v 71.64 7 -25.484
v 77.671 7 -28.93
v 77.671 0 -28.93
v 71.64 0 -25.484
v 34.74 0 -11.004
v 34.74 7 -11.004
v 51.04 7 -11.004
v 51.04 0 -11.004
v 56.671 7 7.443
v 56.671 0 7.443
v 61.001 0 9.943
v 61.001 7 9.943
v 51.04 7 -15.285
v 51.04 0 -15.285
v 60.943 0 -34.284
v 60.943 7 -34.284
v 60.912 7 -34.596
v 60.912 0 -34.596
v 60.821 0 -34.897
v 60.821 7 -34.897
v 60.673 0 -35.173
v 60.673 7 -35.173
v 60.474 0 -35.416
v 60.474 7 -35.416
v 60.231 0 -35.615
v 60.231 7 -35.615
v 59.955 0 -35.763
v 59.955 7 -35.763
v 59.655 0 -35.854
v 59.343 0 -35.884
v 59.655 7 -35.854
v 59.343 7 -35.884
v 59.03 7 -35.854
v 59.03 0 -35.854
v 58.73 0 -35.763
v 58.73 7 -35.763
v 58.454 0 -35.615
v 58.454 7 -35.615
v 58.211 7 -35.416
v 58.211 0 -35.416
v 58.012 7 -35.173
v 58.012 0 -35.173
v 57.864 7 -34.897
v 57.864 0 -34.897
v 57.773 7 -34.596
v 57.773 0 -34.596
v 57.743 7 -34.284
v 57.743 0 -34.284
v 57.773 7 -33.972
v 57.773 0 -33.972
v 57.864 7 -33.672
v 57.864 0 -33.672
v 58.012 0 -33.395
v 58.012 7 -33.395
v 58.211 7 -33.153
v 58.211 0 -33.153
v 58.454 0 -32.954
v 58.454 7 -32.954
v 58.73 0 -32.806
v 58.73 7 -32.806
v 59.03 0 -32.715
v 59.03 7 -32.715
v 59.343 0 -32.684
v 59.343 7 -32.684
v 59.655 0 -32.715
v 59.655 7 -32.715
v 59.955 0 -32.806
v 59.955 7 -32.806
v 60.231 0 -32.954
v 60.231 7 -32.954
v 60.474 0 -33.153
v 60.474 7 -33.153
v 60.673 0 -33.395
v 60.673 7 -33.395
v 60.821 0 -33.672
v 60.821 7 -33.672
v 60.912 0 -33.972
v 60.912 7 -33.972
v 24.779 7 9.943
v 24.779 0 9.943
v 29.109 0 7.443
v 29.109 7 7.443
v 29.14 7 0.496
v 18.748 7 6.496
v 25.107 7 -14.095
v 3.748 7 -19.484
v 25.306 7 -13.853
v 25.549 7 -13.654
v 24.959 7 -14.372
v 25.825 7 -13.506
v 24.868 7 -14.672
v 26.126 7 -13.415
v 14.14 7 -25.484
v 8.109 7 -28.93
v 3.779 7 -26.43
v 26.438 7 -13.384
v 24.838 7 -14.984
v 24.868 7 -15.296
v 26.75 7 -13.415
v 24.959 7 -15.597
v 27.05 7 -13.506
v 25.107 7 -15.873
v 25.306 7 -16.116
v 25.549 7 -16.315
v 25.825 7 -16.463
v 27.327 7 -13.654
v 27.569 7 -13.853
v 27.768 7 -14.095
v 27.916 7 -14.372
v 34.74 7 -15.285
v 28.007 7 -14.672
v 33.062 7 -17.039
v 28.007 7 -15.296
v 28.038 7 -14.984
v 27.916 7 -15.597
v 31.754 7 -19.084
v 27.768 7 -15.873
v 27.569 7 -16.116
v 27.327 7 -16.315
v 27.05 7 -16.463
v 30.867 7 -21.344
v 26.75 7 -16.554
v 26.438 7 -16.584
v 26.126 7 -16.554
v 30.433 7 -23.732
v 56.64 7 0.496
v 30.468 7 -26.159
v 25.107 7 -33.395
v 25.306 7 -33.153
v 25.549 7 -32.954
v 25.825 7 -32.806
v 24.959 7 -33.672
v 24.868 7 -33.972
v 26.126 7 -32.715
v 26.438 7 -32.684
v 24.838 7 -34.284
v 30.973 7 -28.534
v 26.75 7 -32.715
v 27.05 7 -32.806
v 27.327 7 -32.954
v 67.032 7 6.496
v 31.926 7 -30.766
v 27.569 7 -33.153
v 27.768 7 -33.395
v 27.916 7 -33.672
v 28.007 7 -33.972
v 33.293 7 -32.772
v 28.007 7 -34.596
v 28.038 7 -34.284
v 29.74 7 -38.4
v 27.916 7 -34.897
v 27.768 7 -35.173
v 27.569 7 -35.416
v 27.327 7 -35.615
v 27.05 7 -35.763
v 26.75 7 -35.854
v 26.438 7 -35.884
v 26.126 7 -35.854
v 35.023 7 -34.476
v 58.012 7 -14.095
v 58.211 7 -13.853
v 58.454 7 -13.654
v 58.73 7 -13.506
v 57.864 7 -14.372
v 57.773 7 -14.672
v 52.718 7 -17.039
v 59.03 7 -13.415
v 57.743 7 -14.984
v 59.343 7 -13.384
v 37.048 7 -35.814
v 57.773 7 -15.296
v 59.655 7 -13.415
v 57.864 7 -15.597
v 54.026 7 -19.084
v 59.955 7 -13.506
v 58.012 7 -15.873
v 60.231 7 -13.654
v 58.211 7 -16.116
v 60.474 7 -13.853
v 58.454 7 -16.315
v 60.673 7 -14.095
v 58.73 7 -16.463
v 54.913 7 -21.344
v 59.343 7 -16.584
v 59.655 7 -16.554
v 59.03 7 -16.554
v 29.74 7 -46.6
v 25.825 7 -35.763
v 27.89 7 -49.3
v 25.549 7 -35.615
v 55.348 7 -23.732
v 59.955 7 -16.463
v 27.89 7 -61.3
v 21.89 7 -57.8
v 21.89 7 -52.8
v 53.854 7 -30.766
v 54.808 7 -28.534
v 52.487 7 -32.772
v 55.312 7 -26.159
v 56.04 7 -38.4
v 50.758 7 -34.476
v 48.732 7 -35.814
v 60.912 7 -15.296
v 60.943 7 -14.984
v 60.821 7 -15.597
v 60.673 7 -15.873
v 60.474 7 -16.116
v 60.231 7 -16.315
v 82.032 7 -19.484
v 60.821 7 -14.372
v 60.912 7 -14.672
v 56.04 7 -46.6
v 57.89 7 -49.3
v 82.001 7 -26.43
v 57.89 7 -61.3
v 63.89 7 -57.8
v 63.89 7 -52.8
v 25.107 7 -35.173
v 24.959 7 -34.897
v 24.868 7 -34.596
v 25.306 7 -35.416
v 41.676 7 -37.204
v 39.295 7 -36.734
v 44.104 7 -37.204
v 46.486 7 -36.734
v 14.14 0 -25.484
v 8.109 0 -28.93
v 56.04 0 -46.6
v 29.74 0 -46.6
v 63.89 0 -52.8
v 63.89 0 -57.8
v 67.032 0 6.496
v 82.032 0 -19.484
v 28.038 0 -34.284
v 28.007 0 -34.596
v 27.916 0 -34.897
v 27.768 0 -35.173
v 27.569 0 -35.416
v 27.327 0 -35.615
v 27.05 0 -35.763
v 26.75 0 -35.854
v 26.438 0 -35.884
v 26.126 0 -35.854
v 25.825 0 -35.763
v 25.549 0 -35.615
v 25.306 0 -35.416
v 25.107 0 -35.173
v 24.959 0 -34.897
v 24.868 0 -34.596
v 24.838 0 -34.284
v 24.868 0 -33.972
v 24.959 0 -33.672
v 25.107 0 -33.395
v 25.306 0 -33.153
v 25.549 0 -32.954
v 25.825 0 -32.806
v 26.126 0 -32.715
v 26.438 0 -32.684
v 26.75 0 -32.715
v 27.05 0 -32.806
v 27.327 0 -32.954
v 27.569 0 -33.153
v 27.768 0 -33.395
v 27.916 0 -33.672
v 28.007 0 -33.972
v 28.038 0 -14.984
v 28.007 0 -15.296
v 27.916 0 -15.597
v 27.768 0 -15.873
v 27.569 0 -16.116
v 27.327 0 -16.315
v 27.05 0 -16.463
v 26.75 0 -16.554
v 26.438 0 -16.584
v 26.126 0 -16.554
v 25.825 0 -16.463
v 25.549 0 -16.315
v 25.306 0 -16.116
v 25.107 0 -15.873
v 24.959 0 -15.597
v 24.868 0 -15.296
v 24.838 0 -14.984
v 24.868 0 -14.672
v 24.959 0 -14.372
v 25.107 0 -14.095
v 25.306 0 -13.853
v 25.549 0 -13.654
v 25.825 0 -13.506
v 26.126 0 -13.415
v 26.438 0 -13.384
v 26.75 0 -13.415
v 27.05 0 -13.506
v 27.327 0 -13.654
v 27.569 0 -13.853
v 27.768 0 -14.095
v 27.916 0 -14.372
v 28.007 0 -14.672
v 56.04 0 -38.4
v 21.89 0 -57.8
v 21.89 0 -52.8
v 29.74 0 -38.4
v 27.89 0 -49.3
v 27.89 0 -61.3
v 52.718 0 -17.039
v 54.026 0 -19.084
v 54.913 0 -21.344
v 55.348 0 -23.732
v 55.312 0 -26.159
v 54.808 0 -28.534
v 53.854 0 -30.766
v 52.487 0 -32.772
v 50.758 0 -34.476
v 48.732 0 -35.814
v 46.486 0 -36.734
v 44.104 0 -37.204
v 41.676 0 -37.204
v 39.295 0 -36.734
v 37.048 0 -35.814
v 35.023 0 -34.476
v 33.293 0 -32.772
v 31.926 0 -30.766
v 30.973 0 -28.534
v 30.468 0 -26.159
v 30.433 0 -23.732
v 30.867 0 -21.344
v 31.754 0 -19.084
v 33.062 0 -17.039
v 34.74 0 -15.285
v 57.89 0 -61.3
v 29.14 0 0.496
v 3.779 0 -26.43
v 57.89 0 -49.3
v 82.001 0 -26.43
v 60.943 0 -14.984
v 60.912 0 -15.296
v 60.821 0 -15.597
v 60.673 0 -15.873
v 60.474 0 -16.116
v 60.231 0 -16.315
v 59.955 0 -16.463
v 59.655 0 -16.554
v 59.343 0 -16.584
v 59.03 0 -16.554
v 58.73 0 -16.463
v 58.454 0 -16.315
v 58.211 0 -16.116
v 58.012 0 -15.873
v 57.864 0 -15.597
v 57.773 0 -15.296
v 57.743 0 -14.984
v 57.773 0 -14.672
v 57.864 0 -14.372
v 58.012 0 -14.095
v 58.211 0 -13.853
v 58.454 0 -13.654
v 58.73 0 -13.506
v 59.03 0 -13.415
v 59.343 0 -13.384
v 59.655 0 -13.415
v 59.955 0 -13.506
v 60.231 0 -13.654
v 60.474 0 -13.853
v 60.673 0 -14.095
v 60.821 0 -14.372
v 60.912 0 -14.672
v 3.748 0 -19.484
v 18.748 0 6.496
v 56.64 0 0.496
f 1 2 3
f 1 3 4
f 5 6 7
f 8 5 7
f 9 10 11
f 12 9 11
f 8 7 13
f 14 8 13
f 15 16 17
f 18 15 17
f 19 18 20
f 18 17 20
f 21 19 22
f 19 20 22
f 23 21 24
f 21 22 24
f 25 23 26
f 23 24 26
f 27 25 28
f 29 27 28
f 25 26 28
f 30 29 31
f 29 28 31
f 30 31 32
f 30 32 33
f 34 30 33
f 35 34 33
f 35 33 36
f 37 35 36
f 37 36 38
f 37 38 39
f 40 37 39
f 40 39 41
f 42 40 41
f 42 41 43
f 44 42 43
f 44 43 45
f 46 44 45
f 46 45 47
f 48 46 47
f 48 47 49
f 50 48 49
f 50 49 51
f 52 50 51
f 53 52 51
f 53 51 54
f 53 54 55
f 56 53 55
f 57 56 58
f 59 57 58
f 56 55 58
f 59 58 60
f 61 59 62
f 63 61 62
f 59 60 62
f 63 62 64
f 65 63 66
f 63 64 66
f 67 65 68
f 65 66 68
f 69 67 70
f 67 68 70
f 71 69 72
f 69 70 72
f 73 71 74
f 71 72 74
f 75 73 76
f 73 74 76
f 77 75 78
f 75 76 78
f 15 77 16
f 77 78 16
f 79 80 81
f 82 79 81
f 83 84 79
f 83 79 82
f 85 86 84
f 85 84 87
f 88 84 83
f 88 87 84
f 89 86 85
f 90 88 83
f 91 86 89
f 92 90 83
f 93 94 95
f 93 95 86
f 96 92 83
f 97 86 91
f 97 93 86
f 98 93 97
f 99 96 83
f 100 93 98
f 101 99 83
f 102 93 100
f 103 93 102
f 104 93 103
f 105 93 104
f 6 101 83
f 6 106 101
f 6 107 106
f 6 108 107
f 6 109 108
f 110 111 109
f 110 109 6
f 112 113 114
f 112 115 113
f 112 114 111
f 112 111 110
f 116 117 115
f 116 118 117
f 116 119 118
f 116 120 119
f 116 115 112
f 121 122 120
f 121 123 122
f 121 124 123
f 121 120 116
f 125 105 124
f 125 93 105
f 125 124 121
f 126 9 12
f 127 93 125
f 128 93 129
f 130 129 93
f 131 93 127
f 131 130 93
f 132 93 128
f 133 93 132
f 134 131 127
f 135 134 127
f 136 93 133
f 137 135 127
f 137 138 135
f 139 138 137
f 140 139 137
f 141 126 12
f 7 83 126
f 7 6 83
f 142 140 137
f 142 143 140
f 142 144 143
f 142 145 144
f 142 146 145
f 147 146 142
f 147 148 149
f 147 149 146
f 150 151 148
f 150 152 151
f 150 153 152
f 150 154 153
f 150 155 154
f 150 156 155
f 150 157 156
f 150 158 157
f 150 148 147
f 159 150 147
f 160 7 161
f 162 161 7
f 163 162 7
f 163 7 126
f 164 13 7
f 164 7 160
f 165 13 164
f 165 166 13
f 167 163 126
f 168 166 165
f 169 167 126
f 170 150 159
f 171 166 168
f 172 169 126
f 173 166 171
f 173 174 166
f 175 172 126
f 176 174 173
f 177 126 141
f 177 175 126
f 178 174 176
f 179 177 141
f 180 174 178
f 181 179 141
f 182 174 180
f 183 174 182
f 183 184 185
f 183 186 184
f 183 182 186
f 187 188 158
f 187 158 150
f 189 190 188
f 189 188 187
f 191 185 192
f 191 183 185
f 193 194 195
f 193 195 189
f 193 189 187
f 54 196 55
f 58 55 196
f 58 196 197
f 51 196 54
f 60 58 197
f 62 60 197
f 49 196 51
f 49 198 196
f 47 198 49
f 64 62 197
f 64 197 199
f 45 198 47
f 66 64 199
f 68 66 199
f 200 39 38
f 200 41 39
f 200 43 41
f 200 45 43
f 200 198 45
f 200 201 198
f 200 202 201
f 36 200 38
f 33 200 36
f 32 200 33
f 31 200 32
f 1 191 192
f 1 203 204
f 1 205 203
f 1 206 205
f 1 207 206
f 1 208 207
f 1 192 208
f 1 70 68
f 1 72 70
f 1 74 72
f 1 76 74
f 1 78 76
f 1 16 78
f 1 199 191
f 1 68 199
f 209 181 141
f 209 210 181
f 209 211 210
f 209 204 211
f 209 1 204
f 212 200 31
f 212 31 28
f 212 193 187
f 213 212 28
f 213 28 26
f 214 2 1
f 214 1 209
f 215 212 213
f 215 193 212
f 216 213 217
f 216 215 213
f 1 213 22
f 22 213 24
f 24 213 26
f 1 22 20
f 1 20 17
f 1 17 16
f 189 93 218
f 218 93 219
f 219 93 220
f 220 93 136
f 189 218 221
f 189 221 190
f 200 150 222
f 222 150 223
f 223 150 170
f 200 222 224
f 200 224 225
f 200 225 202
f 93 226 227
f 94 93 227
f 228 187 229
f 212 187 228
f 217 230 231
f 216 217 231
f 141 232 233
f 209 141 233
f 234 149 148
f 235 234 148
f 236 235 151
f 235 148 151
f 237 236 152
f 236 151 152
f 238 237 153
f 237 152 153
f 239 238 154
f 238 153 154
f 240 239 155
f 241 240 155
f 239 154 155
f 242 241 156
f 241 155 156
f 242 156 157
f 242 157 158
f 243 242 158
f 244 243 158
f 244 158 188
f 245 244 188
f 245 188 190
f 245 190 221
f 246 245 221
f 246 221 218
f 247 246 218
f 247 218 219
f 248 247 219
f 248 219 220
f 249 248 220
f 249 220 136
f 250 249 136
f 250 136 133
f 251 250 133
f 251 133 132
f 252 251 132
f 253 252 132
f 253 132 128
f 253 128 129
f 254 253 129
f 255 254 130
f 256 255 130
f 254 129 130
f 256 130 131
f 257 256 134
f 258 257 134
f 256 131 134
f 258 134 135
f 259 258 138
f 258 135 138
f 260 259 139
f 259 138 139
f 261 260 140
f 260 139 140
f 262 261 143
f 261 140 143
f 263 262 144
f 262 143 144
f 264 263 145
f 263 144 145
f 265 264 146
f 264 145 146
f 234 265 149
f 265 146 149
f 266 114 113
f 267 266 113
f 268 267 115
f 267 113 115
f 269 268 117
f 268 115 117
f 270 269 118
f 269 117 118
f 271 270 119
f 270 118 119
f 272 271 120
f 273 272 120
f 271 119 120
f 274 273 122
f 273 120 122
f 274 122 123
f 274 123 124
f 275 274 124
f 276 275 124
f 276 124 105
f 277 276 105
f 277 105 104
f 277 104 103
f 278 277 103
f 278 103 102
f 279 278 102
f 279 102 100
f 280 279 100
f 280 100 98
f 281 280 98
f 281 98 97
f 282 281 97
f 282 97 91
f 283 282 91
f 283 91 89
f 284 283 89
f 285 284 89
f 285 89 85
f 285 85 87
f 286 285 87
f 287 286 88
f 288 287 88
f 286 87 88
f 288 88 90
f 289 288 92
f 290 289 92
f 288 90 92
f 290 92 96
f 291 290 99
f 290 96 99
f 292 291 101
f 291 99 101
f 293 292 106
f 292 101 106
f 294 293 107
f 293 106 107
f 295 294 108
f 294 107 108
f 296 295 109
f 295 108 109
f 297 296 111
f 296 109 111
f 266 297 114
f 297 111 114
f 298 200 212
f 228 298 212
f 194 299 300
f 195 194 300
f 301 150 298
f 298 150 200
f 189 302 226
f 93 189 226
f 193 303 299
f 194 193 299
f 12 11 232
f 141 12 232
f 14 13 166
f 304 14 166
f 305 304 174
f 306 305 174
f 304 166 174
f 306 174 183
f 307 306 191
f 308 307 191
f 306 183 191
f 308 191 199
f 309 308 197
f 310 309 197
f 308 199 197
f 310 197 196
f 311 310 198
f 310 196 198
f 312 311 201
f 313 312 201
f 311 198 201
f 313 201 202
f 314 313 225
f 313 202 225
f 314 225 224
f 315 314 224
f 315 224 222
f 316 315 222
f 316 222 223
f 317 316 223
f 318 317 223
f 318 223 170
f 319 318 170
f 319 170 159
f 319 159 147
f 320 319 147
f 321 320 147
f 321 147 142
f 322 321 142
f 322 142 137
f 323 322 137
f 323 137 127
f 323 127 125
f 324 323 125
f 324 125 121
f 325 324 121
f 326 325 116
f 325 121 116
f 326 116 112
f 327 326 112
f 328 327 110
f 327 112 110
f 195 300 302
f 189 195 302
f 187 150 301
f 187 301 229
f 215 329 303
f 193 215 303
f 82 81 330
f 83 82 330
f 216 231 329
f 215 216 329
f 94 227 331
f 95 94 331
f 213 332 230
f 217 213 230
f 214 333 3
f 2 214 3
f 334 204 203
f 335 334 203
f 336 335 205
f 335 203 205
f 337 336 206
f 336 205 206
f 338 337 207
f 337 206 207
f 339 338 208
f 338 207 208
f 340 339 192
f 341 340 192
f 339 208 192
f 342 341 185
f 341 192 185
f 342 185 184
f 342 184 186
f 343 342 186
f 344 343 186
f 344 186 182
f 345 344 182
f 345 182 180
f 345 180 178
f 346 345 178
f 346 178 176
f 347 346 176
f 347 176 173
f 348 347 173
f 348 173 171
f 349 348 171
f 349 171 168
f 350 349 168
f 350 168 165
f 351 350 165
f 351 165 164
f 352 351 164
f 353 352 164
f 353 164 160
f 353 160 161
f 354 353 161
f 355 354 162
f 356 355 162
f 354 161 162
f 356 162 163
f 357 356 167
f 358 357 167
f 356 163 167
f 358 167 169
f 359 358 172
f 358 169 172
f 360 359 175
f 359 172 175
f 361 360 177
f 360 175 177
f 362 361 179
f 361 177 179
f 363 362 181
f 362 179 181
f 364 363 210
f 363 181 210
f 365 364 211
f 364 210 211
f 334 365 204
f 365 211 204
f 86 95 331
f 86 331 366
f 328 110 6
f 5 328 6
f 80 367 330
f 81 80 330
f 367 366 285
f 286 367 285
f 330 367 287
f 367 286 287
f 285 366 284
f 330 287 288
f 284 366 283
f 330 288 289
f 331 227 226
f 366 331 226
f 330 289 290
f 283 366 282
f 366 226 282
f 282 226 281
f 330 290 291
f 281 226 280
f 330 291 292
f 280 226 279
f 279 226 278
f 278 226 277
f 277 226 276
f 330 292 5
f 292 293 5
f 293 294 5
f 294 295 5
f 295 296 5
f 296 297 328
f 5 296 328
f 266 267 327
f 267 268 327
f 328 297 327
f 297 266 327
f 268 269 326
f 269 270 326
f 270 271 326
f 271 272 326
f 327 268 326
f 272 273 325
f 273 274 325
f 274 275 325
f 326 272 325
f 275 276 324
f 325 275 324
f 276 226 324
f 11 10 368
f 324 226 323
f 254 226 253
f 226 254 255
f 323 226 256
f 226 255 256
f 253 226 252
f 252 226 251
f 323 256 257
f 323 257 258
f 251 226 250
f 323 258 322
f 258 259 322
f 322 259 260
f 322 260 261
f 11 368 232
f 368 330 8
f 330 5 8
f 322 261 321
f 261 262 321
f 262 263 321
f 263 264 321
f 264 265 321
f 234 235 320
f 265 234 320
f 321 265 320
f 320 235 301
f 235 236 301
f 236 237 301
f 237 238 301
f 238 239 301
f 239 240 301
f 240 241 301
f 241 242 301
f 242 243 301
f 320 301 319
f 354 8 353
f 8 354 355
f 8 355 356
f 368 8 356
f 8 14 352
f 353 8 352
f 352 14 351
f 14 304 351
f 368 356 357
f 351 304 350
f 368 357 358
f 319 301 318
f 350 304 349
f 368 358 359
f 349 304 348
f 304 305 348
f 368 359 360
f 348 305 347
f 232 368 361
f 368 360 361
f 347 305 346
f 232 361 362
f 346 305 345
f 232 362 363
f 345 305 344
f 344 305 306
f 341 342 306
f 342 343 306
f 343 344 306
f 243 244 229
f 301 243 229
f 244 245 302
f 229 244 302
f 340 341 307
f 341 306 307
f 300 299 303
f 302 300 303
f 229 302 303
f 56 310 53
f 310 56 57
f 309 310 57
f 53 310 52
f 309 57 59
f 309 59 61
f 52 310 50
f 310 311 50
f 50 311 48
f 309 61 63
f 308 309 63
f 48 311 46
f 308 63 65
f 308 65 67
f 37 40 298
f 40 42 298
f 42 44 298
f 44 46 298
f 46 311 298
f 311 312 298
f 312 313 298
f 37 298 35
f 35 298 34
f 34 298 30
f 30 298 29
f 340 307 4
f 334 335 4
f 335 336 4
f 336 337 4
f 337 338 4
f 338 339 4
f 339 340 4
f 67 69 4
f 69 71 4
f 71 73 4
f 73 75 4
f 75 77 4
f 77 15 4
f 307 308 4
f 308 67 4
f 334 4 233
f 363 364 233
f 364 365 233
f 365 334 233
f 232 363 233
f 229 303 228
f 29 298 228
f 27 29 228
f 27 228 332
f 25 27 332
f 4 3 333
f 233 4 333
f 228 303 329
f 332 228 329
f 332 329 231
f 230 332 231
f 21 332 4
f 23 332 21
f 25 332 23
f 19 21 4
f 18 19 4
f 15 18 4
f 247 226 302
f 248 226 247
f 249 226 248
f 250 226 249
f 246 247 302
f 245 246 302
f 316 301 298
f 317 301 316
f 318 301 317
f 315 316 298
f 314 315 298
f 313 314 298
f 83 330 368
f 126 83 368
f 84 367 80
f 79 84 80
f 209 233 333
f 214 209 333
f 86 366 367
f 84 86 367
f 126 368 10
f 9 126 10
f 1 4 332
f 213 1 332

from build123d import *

# Parameters (mm, degrees)
BOSS_EXTRUDE3_DEPTH = 7
SKETCH2_R           = 1.6
SKETCH2_W           = 26.3
SKETCH2_H           = 8.2
CUT_EXTRUDE1_DEPTH  = 8


with BuildPart() as part:
    # Sketch1 → Boss-Extrude3 (new body)
    with BuildSketch(Plane(origin=(0, 0, 0), x_dir=(1, 0, 0), z_dir=(0, 1, 0))):
        Polygon((29.1090159, -7.44261314), (29.140104813, -0.496460718), (42.890104813, -0.496460718), (56.640104813, -0.496460718), (56.671193726, -7.44261314), (61.001320745, -9.94261314), (67.032409659, -6.496460718), (82.032409659, 19.484301396), (82.001320745, 26.430453819), (77.671193726, 28.930453819), (71.640104813, 25.484301396), (64.765104813, 37.392150698), (57.890104813, 49.3), (63.890104813, 52.8), (63.890104813, 57.8), (57.890104813, 61.3), (27.890104813, 61.3), (21.890104813, 57.8), (21.890104813, 52.8), (27.890104813, 49.3), (21.015104813, 37.392150698), (14.140104813, 25.484301396), (8.1090159, 28.930453819), (3.778888881, 26.430453819), (3.747799968, 19.484301396), (18.747799968, -6.496460718), (24.778888881, -9.94261314), align=None)
    extrude(amount=BOSS_EXTRUDE3_DEPTH)

    # Sketch2 → Cut-Extrude1 (cut, through all)
    with BuildSketch(Plane(origin=(0, 7, 0), x_dir=(1, 0, 0), z_dir=(0, 1, 0))):
        with Locations((59.342544079, 34.284301396)):
            Circle(SKETCH2_R)
        with Locations((59.342544079, 14.984301396)):
            Circle(SKETCH2_R)
        with Locations((26.437665547, 14.984301396)):
            Circle(SKETCH2_R)
        with Locations((26.437665547, 34.284301396)):
            Circle(SKETCH2_R)
        with BuildLine():
            Line((34.740104813, 11.003539282), (51.040104813, 11.003539282))
            Line((51.040104813, 11.003539282), (51.040104813, 15.284876488))
            ThreePointArc((51.040104813, 15.284876488), (42.890104813, 37.262613559), (34.740104813, 15.284876488))
            Line((34.740104813, 15.284876488), (34.740104813, 11.003539282))
        make_face()
        with Locations((42.890104813, 42.5)):
            Rectangle(SKETCH2_W, SKETCH2_H)
    extrude(amount=-CUT_EXTRUDE1_DEPTH, mode=Mode.SUBTRACT)


solid = part.part
